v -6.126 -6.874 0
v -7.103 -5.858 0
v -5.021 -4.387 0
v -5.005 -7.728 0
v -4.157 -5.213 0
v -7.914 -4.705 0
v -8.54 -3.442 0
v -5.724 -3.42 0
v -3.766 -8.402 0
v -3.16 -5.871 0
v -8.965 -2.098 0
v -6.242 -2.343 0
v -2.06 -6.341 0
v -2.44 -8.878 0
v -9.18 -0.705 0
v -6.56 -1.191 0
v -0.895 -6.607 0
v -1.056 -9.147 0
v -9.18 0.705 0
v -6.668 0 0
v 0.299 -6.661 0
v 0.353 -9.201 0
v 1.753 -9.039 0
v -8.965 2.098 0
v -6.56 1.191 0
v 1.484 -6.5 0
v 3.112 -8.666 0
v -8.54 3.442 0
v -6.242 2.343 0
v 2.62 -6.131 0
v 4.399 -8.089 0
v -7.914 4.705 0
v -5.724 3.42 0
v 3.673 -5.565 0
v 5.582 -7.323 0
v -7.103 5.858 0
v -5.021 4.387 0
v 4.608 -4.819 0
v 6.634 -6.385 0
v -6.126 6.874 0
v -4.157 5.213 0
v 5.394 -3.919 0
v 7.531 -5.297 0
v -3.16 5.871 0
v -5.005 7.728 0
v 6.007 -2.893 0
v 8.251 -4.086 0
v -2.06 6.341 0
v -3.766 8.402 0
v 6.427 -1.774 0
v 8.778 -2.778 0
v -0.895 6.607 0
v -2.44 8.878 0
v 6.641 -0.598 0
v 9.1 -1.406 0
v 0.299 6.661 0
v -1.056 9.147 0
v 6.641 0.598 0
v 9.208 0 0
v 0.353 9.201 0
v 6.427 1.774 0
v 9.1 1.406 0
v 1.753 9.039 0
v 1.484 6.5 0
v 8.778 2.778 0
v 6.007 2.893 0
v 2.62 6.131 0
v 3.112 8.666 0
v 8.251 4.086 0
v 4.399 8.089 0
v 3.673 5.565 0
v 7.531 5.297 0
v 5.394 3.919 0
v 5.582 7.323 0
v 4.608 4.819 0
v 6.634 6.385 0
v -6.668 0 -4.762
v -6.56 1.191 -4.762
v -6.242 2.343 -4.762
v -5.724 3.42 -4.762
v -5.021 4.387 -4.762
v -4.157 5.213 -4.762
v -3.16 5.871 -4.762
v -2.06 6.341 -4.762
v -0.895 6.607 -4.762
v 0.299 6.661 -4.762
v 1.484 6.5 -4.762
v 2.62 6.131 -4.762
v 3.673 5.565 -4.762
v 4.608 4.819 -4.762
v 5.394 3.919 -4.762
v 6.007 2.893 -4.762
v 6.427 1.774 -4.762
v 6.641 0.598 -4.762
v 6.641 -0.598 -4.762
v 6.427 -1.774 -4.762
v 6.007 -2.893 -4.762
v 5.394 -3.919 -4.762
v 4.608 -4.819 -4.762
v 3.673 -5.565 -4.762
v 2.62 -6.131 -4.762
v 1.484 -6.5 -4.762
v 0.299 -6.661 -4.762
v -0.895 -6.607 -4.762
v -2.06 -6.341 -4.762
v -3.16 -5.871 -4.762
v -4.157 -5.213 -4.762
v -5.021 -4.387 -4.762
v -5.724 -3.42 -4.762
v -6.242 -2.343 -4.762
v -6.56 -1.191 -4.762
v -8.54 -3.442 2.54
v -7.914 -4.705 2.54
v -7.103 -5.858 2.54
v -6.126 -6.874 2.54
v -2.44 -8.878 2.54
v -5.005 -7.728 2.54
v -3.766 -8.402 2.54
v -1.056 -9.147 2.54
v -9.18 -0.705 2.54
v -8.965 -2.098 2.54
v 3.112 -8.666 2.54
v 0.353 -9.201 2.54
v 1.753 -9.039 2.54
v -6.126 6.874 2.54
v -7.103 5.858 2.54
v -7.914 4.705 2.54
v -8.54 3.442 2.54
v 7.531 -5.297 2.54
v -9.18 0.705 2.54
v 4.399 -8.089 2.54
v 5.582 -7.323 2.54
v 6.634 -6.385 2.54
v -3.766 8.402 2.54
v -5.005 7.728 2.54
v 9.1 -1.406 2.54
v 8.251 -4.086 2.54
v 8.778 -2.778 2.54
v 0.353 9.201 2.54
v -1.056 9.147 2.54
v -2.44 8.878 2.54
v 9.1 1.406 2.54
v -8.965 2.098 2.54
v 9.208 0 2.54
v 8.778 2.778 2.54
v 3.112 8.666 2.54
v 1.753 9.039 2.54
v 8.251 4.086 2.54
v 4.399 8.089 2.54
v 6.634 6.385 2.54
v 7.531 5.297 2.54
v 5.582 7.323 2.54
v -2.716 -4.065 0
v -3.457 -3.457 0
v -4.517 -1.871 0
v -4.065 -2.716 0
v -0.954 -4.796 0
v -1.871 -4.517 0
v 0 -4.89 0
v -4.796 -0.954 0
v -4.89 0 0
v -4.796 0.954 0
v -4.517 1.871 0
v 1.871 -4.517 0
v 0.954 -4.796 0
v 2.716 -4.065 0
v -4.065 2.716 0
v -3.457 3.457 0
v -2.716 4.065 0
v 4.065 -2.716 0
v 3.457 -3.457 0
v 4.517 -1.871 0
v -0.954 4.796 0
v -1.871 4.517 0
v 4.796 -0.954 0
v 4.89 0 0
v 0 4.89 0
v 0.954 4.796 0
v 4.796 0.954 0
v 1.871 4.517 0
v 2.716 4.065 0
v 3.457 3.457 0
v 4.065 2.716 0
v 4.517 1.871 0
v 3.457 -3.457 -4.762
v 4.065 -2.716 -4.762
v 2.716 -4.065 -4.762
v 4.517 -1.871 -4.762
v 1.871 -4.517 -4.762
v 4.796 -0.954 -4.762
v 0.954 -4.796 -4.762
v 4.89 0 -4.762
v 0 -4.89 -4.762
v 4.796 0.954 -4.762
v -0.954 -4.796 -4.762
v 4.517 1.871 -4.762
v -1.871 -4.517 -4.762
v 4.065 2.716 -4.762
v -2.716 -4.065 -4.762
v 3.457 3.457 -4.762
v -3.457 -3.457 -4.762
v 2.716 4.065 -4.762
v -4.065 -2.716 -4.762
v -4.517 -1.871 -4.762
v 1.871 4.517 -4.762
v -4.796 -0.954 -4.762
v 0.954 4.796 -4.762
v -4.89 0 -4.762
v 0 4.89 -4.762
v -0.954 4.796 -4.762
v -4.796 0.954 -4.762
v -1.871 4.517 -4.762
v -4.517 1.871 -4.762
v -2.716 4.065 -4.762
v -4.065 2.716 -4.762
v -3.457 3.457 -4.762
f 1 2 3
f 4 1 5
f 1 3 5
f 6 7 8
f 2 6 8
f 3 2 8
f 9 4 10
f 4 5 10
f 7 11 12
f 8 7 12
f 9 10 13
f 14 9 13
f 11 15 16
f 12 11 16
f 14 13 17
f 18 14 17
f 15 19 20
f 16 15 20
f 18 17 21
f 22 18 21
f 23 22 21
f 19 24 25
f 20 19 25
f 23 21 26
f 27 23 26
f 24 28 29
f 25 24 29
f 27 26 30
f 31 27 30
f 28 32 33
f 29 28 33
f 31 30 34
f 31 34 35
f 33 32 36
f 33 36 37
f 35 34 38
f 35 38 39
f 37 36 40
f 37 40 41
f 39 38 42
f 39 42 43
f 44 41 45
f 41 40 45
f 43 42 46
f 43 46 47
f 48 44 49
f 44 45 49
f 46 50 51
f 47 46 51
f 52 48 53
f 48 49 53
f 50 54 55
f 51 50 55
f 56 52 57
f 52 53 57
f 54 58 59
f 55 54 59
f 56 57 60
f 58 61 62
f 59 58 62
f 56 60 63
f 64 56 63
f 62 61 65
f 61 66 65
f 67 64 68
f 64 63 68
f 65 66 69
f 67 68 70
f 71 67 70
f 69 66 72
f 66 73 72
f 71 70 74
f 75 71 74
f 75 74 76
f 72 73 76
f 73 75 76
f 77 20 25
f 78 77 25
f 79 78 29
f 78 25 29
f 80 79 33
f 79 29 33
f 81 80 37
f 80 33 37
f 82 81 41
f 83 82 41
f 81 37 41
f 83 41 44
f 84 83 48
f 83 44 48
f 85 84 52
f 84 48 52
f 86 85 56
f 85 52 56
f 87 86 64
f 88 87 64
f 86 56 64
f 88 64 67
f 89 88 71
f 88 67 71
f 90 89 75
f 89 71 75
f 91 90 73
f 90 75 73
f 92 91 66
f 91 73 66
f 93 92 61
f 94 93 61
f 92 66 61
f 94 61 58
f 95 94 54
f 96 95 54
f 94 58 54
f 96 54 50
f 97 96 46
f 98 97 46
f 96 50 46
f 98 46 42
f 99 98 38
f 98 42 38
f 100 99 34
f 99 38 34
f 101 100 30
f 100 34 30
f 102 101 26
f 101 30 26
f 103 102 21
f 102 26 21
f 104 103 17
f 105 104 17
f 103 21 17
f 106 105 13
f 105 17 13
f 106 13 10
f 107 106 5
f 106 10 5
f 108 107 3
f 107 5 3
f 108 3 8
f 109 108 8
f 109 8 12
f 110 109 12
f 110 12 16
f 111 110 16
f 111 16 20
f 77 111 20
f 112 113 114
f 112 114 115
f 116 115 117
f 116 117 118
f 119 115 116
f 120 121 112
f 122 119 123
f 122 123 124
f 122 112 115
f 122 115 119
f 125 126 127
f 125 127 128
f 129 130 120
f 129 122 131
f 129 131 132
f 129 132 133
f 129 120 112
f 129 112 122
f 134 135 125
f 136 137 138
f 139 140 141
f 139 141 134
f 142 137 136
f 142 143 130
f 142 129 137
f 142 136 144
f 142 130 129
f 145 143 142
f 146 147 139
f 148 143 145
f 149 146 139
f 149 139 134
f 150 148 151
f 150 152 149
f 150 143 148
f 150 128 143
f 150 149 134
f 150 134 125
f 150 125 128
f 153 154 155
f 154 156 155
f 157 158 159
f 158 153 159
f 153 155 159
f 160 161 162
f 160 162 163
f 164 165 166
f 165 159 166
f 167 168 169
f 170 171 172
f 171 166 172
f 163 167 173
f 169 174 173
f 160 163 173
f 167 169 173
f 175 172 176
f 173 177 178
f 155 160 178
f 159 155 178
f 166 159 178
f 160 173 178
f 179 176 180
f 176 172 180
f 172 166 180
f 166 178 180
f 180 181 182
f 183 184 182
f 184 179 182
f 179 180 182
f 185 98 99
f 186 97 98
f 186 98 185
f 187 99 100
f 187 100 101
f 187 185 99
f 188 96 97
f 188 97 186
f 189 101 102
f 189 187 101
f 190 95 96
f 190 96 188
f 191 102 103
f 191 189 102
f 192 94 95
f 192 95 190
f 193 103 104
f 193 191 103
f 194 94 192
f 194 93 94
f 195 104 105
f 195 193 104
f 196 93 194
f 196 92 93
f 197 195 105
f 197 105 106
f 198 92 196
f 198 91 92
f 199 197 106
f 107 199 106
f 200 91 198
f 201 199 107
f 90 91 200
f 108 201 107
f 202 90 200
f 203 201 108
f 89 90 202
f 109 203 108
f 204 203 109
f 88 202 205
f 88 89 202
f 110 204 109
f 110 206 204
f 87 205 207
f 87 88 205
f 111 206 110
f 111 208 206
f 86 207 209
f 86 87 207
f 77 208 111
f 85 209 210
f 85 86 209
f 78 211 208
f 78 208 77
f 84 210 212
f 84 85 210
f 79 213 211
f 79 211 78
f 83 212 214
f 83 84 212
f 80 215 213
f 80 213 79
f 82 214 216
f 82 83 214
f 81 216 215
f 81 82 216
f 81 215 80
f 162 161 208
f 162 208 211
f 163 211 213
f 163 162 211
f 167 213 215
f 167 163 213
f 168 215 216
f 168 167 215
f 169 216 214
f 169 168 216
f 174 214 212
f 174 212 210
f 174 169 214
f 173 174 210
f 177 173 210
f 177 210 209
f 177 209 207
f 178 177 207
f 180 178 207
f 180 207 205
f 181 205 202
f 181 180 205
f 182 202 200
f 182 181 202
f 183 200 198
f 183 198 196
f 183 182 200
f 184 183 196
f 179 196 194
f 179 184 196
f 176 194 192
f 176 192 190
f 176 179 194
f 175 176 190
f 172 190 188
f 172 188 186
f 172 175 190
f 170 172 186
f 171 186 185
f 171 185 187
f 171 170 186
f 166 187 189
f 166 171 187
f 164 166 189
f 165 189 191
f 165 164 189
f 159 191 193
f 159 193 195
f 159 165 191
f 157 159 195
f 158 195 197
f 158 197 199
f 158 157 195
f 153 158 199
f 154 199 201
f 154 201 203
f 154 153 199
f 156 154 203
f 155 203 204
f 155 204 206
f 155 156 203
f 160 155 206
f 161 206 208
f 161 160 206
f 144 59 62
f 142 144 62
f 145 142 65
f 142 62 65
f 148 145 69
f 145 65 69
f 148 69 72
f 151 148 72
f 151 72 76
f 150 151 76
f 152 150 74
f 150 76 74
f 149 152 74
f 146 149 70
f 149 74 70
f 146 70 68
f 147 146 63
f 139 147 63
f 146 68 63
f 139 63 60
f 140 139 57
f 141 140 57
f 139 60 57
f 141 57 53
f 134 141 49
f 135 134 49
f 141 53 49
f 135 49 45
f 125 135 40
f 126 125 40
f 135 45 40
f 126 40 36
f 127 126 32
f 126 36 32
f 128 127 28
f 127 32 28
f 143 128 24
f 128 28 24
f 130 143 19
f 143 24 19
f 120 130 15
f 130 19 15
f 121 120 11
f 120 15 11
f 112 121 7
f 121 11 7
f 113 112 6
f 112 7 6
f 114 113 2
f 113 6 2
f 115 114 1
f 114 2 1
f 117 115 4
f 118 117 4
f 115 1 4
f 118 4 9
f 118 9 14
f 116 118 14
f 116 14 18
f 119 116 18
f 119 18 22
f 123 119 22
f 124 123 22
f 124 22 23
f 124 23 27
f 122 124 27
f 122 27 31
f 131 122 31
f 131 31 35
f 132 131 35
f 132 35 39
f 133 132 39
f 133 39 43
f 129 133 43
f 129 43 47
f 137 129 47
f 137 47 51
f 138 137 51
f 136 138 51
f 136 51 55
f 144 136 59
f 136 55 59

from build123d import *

# Parameters (mm, degrees)
SKETCH1_R           = 9.2075
BOSS_EXTRUDE1_DEPTH = 2.54
SKETCH2_R           = 6.6675
SKETCH2_R_2         = 4.8895
BOSS_EXTRUDE2_DEPTH = 4.7625


with BuildPart() as part:
    # Sketch1 → Boss-Extrude1 (new body)
    with BuildSketch(Plane.XY):
        Circle(SKETCH1_R)
    extrude(amount=BOSS_EXTRUDE1_DEPTH)

    # Sketch2 → Boss-Extrude2 (add)
    with BuildSketch(Plane(origin=(0, 0, 0), x_dir=(-1, 0, 0), z_dir=(0, 0, -1))):
        Circle(SKETCH2_R)
        Circle(SKETCH2_R_2, mode=Mode.SUBTRACT)
    extrude(amount=BOSS_EXTRUDE2_DEPTH)


solid = part.part
